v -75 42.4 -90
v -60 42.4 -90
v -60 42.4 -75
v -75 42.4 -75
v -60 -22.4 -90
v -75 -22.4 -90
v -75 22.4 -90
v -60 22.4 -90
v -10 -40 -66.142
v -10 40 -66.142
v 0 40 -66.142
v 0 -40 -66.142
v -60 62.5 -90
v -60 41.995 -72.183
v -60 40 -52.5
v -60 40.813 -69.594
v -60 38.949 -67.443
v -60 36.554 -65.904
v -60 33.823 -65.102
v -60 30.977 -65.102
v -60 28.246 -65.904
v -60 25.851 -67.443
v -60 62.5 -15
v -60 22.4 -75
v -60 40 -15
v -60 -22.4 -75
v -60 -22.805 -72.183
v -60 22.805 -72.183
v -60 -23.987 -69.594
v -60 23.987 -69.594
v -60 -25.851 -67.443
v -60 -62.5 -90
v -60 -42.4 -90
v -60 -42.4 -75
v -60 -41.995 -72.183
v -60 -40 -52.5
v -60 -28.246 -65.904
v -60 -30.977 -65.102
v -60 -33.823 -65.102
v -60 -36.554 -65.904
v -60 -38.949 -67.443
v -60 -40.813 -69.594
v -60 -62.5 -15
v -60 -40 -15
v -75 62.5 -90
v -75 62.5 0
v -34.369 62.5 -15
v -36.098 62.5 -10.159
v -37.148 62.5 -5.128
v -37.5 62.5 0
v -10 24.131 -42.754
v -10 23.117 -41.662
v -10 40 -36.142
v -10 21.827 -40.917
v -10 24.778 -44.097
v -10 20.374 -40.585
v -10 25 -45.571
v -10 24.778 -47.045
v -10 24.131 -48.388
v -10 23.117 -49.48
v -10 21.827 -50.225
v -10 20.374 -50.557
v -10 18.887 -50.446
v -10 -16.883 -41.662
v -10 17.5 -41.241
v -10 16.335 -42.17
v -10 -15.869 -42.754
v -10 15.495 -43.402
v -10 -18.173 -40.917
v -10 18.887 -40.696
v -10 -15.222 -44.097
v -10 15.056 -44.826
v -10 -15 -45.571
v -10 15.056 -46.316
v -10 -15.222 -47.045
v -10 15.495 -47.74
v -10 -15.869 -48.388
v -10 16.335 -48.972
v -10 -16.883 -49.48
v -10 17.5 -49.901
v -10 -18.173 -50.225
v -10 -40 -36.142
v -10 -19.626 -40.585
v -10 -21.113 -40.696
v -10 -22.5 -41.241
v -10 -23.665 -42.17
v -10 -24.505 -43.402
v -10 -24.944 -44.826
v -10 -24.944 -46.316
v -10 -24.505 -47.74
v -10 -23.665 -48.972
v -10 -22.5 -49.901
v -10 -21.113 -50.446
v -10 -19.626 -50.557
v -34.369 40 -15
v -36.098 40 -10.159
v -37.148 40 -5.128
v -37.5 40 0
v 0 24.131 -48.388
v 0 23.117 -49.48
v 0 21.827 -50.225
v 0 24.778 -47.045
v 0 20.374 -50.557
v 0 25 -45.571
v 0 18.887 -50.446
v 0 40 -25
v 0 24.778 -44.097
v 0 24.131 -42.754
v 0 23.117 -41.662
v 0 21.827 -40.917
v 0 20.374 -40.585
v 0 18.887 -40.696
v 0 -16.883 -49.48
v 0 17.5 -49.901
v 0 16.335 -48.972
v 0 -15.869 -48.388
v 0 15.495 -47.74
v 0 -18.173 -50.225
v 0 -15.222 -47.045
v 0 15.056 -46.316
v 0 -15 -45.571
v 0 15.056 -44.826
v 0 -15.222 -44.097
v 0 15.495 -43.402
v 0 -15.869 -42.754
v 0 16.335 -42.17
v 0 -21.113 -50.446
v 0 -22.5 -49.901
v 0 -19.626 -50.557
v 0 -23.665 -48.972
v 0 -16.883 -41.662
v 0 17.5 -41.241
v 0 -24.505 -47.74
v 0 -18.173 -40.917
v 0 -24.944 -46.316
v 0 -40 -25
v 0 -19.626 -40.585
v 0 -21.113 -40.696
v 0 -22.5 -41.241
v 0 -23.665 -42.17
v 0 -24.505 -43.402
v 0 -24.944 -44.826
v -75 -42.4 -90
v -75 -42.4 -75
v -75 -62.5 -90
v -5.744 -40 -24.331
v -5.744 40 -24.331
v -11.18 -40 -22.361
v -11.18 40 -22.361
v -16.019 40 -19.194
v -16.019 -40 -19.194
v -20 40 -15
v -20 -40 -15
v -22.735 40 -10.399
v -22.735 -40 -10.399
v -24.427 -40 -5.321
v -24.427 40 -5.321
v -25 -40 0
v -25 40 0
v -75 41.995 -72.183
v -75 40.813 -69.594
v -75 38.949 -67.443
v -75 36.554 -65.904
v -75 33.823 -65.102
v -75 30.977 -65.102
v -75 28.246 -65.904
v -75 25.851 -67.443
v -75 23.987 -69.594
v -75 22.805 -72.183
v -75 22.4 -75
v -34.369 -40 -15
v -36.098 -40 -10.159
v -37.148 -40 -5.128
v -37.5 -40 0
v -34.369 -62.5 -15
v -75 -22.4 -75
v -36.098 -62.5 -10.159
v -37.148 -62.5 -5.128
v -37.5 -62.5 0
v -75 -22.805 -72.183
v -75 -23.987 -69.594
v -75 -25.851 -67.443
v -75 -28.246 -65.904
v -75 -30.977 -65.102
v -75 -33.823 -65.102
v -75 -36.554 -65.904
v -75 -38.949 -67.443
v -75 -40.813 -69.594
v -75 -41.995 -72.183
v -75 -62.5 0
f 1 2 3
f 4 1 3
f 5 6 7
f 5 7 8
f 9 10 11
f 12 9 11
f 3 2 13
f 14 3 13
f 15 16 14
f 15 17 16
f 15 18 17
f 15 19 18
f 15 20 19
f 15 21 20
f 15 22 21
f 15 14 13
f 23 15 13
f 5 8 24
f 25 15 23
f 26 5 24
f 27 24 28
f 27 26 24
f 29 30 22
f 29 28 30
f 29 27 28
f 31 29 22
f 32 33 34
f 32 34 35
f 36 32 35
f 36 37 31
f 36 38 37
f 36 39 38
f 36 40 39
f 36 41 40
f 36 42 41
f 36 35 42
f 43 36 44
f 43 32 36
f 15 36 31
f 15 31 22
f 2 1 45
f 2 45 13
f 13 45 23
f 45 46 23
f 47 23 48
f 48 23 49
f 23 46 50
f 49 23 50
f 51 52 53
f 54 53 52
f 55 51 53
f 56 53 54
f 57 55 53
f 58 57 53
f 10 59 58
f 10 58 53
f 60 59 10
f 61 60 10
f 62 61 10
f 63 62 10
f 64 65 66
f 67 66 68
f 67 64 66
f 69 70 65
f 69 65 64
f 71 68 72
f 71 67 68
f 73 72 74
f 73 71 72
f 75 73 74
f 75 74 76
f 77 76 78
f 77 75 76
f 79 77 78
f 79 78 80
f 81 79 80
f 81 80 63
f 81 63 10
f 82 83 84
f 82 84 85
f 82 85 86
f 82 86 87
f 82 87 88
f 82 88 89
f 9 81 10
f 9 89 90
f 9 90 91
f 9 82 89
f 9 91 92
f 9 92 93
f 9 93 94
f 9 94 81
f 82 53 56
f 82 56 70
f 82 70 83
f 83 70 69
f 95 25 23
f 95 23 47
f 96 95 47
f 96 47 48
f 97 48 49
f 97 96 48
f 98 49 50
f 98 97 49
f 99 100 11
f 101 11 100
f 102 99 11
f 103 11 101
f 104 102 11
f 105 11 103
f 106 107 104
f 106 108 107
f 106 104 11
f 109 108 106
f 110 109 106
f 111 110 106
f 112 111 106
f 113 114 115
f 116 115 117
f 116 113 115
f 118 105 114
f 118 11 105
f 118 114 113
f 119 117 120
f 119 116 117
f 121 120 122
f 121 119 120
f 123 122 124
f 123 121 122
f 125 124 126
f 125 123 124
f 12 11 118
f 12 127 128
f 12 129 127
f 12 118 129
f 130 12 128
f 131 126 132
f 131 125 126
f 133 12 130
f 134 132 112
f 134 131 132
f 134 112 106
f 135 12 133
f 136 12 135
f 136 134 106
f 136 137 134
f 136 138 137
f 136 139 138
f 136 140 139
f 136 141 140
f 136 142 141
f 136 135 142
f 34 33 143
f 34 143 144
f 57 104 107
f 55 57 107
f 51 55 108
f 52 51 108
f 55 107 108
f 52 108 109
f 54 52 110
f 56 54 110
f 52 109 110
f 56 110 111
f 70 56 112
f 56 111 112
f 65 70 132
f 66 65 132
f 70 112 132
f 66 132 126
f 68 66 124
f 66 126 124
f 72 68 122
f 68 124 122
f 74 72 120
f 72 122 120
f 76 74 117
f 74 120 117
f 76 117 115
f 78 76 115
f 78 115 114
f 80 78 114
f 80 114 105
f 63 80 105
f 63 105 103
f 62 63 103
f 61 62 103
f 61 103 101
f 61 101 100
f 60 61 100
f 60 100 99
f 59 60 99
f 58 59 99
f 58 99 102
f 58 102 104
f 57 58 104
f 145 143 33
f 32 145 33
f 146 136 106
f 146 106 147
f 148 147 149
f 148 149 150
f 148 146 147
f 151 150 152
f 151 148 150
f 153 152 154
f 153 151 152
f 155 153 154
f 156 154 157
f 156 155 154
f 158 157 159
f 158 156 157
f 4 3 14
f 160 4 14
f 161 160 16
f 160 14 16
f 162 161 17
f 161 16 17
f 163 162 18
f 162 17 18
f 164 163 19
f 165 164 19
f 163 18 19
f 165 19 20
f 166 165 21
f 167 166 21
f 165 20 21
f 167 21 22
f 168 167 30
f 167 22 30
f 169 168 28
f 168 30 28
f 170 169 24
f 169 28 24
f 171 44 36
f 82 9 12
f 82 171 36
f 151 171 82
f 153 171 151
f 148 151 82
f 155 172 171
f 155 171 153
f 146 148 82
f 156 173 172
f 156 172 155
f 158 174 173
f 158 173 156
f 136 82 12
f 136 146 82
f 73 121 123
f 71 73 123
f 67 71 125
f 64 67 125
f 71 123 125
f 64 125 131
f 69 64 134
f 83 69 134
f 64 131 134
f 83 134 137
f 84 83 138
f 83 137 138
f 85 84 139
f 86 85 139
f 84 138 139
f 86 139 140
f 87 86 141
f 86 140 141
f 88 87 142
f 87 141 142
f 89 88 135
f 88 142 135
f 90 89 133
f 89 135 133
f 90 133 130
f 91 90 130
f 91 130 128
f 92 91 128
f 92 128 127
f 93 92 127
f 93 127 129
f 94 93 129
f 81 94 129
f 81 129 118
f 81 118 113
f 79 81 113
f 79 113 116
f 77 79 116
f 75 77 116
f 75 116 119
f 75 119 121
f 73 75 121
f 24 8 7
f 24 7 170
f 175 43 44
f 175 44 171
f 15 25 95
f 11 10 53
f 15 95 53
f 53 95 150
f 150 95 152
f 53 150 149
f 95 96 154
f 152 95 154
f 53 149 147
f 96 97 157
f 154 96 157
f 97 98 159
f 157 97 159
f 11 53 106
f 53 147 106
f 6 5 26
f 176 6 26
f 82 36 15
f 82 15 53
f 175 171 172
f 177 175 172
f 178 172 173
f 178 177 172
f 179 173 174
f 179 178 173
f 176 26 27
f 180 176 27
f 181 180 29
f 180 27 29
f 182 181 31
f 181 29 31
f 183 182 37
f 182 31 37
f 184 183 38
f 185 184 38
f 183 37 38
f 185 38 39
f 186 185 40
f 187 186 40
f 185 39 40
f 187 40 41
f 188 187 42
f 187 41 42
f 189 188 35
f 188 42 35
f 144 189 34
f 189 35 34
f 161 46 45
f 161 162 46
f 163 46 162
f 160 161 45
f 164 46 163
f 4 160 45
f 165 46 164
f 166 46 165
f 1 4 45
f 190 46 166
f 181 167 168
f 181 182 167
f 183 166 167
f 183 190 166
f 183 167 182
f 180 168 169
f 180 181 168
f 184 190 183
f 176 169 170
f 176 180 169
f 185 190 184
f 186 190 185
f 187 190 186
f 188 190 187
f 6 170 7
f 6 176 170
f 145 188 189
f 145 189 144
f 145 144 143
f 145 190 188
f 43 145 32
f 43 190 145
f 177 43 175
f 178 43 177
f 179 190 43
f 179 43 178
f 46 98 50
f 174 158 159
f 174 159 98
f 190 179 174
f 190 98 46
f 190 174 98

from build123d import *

# Parameters (mm, degrees)
F1_DEPTH = 62.5
F2_W     = 20
F2_H     = 15
F3_DEPTH = 15.001
F4_DEPTH = 40
F5_R     = 5
F6_DEPTH = 15


with BuildPart() as f1:
    # F0 (on Front) → F1 (new body, symmetric)
    with BuildSketch(Plane.XZ):
        Polygon((-60, -15), (-75, -15), (-75, -90), (-60, -90), (-60, -52.5), align=None)
        with BuildLine():
            Line((-37.5, 0), (-75, 0))
            Line((-75, 0), (-75, -15))
            Line((-75, -15), (-60, -15))
            Line((-60, -15), (-34.3693177122, -15))
            ThreePointArc((-34.3693177122, -15), (-36.7089867349, -7.6616116383), (-37.5, 0))
        make_face()
    extrude(amount=F1_DEPTH, both=True)

    # F2 (on face) → F3 (cut, through all)
    with BuildSketch(Plane.YZ.offset(-60)):
        with Locations((32.4, -82.5)):
            Rectangle(F2_W, F2_H)
        with BuildLine():
            Line((22.4, -75), (42.4, -75))
            ThreePointArc((42.4, -75), (32.4, -65), (22.4, -75))
        make_face()
        with Locations((-32.4, -82.5)):
            Rectangle(F2_W, F2_H)
        with BuildLine():
            Line((-42.4, -75), (-22.4, -75))
            ThreePointArc((-22.4, -75), (-32.4, -65), (-42.4, -75))
        make_face()
    extrude(amount=-F3_DEPTH, mode=Mode.SUBTRACT)

    # F0 (on Front) → F4 (join, symmetric)
    with BuildSketch(Plane.XZ):
        with BuildLine():
            Line((-34.3693177122, -15), (-60, -15))
            Line((-60, -15), (-60, -52.5))
            Line((-60, -52.5), (-10, -36.142080737))
            ThreePointArc((-10, -36.142080737), (-24.5744986324, -28.3256776965), (-34.3693177122, -15))
        make_face()
        with BuildLine():
            Line((-20, -15), (-34.3693177122, -15))
            ThreePointArc((-34.3693177122, -15), (-24.5744986324, -28.3256776965), (-10, -36.142080737))
            ThreePointArc((-10, -36.142080737), (-5.0458880468, -37.1589694935), (0, -37.5))
            Line((0, -37.5), (0, -25))
            ThreePointArc((0, -25), (-11.1803398875, -22.360679775), (-20, -15))
        make_face()
        with BuildLine():
            ThreePointArc((0, -37.5), (-5.0458880468, -37.1589694935), (-10, -36.142080737))
            Line((-10, -36.142080737), (-10, -66.142080737))
            Line((-10, -66.142080737), (0, -66.142080737))
            Line((0, -66.142080737), (0, -37.5))
        make_face()
        with BuildLine():
            Line((-25, 0), (-37.5, 0))
            ThreePointArc((-37.5, 0), (-36.7089867349, -7.6616116383), (-34.3693177122, -15))
            Line((-34.3693177122, -15), (-20, -15))
            ThreePointArc((-20, -15), (-23.7170824513, -7.9056941504), (-25, 0))
        make_face()
    extrude(amount=F4_DEPTH, both=True)

    # F5 (on face) → F6 (cut)
    with BuildSketch(Plane.YZ):
        with Locations((-20, -45.5710403685)):
            Circle(F5_R)
        with Locations((20, -45.5710403685)):
            Circle(F5_R)
    extrude(amount=-F6_DEPTH, mode=Mode.SUBTRACT)


solid = f1.part
